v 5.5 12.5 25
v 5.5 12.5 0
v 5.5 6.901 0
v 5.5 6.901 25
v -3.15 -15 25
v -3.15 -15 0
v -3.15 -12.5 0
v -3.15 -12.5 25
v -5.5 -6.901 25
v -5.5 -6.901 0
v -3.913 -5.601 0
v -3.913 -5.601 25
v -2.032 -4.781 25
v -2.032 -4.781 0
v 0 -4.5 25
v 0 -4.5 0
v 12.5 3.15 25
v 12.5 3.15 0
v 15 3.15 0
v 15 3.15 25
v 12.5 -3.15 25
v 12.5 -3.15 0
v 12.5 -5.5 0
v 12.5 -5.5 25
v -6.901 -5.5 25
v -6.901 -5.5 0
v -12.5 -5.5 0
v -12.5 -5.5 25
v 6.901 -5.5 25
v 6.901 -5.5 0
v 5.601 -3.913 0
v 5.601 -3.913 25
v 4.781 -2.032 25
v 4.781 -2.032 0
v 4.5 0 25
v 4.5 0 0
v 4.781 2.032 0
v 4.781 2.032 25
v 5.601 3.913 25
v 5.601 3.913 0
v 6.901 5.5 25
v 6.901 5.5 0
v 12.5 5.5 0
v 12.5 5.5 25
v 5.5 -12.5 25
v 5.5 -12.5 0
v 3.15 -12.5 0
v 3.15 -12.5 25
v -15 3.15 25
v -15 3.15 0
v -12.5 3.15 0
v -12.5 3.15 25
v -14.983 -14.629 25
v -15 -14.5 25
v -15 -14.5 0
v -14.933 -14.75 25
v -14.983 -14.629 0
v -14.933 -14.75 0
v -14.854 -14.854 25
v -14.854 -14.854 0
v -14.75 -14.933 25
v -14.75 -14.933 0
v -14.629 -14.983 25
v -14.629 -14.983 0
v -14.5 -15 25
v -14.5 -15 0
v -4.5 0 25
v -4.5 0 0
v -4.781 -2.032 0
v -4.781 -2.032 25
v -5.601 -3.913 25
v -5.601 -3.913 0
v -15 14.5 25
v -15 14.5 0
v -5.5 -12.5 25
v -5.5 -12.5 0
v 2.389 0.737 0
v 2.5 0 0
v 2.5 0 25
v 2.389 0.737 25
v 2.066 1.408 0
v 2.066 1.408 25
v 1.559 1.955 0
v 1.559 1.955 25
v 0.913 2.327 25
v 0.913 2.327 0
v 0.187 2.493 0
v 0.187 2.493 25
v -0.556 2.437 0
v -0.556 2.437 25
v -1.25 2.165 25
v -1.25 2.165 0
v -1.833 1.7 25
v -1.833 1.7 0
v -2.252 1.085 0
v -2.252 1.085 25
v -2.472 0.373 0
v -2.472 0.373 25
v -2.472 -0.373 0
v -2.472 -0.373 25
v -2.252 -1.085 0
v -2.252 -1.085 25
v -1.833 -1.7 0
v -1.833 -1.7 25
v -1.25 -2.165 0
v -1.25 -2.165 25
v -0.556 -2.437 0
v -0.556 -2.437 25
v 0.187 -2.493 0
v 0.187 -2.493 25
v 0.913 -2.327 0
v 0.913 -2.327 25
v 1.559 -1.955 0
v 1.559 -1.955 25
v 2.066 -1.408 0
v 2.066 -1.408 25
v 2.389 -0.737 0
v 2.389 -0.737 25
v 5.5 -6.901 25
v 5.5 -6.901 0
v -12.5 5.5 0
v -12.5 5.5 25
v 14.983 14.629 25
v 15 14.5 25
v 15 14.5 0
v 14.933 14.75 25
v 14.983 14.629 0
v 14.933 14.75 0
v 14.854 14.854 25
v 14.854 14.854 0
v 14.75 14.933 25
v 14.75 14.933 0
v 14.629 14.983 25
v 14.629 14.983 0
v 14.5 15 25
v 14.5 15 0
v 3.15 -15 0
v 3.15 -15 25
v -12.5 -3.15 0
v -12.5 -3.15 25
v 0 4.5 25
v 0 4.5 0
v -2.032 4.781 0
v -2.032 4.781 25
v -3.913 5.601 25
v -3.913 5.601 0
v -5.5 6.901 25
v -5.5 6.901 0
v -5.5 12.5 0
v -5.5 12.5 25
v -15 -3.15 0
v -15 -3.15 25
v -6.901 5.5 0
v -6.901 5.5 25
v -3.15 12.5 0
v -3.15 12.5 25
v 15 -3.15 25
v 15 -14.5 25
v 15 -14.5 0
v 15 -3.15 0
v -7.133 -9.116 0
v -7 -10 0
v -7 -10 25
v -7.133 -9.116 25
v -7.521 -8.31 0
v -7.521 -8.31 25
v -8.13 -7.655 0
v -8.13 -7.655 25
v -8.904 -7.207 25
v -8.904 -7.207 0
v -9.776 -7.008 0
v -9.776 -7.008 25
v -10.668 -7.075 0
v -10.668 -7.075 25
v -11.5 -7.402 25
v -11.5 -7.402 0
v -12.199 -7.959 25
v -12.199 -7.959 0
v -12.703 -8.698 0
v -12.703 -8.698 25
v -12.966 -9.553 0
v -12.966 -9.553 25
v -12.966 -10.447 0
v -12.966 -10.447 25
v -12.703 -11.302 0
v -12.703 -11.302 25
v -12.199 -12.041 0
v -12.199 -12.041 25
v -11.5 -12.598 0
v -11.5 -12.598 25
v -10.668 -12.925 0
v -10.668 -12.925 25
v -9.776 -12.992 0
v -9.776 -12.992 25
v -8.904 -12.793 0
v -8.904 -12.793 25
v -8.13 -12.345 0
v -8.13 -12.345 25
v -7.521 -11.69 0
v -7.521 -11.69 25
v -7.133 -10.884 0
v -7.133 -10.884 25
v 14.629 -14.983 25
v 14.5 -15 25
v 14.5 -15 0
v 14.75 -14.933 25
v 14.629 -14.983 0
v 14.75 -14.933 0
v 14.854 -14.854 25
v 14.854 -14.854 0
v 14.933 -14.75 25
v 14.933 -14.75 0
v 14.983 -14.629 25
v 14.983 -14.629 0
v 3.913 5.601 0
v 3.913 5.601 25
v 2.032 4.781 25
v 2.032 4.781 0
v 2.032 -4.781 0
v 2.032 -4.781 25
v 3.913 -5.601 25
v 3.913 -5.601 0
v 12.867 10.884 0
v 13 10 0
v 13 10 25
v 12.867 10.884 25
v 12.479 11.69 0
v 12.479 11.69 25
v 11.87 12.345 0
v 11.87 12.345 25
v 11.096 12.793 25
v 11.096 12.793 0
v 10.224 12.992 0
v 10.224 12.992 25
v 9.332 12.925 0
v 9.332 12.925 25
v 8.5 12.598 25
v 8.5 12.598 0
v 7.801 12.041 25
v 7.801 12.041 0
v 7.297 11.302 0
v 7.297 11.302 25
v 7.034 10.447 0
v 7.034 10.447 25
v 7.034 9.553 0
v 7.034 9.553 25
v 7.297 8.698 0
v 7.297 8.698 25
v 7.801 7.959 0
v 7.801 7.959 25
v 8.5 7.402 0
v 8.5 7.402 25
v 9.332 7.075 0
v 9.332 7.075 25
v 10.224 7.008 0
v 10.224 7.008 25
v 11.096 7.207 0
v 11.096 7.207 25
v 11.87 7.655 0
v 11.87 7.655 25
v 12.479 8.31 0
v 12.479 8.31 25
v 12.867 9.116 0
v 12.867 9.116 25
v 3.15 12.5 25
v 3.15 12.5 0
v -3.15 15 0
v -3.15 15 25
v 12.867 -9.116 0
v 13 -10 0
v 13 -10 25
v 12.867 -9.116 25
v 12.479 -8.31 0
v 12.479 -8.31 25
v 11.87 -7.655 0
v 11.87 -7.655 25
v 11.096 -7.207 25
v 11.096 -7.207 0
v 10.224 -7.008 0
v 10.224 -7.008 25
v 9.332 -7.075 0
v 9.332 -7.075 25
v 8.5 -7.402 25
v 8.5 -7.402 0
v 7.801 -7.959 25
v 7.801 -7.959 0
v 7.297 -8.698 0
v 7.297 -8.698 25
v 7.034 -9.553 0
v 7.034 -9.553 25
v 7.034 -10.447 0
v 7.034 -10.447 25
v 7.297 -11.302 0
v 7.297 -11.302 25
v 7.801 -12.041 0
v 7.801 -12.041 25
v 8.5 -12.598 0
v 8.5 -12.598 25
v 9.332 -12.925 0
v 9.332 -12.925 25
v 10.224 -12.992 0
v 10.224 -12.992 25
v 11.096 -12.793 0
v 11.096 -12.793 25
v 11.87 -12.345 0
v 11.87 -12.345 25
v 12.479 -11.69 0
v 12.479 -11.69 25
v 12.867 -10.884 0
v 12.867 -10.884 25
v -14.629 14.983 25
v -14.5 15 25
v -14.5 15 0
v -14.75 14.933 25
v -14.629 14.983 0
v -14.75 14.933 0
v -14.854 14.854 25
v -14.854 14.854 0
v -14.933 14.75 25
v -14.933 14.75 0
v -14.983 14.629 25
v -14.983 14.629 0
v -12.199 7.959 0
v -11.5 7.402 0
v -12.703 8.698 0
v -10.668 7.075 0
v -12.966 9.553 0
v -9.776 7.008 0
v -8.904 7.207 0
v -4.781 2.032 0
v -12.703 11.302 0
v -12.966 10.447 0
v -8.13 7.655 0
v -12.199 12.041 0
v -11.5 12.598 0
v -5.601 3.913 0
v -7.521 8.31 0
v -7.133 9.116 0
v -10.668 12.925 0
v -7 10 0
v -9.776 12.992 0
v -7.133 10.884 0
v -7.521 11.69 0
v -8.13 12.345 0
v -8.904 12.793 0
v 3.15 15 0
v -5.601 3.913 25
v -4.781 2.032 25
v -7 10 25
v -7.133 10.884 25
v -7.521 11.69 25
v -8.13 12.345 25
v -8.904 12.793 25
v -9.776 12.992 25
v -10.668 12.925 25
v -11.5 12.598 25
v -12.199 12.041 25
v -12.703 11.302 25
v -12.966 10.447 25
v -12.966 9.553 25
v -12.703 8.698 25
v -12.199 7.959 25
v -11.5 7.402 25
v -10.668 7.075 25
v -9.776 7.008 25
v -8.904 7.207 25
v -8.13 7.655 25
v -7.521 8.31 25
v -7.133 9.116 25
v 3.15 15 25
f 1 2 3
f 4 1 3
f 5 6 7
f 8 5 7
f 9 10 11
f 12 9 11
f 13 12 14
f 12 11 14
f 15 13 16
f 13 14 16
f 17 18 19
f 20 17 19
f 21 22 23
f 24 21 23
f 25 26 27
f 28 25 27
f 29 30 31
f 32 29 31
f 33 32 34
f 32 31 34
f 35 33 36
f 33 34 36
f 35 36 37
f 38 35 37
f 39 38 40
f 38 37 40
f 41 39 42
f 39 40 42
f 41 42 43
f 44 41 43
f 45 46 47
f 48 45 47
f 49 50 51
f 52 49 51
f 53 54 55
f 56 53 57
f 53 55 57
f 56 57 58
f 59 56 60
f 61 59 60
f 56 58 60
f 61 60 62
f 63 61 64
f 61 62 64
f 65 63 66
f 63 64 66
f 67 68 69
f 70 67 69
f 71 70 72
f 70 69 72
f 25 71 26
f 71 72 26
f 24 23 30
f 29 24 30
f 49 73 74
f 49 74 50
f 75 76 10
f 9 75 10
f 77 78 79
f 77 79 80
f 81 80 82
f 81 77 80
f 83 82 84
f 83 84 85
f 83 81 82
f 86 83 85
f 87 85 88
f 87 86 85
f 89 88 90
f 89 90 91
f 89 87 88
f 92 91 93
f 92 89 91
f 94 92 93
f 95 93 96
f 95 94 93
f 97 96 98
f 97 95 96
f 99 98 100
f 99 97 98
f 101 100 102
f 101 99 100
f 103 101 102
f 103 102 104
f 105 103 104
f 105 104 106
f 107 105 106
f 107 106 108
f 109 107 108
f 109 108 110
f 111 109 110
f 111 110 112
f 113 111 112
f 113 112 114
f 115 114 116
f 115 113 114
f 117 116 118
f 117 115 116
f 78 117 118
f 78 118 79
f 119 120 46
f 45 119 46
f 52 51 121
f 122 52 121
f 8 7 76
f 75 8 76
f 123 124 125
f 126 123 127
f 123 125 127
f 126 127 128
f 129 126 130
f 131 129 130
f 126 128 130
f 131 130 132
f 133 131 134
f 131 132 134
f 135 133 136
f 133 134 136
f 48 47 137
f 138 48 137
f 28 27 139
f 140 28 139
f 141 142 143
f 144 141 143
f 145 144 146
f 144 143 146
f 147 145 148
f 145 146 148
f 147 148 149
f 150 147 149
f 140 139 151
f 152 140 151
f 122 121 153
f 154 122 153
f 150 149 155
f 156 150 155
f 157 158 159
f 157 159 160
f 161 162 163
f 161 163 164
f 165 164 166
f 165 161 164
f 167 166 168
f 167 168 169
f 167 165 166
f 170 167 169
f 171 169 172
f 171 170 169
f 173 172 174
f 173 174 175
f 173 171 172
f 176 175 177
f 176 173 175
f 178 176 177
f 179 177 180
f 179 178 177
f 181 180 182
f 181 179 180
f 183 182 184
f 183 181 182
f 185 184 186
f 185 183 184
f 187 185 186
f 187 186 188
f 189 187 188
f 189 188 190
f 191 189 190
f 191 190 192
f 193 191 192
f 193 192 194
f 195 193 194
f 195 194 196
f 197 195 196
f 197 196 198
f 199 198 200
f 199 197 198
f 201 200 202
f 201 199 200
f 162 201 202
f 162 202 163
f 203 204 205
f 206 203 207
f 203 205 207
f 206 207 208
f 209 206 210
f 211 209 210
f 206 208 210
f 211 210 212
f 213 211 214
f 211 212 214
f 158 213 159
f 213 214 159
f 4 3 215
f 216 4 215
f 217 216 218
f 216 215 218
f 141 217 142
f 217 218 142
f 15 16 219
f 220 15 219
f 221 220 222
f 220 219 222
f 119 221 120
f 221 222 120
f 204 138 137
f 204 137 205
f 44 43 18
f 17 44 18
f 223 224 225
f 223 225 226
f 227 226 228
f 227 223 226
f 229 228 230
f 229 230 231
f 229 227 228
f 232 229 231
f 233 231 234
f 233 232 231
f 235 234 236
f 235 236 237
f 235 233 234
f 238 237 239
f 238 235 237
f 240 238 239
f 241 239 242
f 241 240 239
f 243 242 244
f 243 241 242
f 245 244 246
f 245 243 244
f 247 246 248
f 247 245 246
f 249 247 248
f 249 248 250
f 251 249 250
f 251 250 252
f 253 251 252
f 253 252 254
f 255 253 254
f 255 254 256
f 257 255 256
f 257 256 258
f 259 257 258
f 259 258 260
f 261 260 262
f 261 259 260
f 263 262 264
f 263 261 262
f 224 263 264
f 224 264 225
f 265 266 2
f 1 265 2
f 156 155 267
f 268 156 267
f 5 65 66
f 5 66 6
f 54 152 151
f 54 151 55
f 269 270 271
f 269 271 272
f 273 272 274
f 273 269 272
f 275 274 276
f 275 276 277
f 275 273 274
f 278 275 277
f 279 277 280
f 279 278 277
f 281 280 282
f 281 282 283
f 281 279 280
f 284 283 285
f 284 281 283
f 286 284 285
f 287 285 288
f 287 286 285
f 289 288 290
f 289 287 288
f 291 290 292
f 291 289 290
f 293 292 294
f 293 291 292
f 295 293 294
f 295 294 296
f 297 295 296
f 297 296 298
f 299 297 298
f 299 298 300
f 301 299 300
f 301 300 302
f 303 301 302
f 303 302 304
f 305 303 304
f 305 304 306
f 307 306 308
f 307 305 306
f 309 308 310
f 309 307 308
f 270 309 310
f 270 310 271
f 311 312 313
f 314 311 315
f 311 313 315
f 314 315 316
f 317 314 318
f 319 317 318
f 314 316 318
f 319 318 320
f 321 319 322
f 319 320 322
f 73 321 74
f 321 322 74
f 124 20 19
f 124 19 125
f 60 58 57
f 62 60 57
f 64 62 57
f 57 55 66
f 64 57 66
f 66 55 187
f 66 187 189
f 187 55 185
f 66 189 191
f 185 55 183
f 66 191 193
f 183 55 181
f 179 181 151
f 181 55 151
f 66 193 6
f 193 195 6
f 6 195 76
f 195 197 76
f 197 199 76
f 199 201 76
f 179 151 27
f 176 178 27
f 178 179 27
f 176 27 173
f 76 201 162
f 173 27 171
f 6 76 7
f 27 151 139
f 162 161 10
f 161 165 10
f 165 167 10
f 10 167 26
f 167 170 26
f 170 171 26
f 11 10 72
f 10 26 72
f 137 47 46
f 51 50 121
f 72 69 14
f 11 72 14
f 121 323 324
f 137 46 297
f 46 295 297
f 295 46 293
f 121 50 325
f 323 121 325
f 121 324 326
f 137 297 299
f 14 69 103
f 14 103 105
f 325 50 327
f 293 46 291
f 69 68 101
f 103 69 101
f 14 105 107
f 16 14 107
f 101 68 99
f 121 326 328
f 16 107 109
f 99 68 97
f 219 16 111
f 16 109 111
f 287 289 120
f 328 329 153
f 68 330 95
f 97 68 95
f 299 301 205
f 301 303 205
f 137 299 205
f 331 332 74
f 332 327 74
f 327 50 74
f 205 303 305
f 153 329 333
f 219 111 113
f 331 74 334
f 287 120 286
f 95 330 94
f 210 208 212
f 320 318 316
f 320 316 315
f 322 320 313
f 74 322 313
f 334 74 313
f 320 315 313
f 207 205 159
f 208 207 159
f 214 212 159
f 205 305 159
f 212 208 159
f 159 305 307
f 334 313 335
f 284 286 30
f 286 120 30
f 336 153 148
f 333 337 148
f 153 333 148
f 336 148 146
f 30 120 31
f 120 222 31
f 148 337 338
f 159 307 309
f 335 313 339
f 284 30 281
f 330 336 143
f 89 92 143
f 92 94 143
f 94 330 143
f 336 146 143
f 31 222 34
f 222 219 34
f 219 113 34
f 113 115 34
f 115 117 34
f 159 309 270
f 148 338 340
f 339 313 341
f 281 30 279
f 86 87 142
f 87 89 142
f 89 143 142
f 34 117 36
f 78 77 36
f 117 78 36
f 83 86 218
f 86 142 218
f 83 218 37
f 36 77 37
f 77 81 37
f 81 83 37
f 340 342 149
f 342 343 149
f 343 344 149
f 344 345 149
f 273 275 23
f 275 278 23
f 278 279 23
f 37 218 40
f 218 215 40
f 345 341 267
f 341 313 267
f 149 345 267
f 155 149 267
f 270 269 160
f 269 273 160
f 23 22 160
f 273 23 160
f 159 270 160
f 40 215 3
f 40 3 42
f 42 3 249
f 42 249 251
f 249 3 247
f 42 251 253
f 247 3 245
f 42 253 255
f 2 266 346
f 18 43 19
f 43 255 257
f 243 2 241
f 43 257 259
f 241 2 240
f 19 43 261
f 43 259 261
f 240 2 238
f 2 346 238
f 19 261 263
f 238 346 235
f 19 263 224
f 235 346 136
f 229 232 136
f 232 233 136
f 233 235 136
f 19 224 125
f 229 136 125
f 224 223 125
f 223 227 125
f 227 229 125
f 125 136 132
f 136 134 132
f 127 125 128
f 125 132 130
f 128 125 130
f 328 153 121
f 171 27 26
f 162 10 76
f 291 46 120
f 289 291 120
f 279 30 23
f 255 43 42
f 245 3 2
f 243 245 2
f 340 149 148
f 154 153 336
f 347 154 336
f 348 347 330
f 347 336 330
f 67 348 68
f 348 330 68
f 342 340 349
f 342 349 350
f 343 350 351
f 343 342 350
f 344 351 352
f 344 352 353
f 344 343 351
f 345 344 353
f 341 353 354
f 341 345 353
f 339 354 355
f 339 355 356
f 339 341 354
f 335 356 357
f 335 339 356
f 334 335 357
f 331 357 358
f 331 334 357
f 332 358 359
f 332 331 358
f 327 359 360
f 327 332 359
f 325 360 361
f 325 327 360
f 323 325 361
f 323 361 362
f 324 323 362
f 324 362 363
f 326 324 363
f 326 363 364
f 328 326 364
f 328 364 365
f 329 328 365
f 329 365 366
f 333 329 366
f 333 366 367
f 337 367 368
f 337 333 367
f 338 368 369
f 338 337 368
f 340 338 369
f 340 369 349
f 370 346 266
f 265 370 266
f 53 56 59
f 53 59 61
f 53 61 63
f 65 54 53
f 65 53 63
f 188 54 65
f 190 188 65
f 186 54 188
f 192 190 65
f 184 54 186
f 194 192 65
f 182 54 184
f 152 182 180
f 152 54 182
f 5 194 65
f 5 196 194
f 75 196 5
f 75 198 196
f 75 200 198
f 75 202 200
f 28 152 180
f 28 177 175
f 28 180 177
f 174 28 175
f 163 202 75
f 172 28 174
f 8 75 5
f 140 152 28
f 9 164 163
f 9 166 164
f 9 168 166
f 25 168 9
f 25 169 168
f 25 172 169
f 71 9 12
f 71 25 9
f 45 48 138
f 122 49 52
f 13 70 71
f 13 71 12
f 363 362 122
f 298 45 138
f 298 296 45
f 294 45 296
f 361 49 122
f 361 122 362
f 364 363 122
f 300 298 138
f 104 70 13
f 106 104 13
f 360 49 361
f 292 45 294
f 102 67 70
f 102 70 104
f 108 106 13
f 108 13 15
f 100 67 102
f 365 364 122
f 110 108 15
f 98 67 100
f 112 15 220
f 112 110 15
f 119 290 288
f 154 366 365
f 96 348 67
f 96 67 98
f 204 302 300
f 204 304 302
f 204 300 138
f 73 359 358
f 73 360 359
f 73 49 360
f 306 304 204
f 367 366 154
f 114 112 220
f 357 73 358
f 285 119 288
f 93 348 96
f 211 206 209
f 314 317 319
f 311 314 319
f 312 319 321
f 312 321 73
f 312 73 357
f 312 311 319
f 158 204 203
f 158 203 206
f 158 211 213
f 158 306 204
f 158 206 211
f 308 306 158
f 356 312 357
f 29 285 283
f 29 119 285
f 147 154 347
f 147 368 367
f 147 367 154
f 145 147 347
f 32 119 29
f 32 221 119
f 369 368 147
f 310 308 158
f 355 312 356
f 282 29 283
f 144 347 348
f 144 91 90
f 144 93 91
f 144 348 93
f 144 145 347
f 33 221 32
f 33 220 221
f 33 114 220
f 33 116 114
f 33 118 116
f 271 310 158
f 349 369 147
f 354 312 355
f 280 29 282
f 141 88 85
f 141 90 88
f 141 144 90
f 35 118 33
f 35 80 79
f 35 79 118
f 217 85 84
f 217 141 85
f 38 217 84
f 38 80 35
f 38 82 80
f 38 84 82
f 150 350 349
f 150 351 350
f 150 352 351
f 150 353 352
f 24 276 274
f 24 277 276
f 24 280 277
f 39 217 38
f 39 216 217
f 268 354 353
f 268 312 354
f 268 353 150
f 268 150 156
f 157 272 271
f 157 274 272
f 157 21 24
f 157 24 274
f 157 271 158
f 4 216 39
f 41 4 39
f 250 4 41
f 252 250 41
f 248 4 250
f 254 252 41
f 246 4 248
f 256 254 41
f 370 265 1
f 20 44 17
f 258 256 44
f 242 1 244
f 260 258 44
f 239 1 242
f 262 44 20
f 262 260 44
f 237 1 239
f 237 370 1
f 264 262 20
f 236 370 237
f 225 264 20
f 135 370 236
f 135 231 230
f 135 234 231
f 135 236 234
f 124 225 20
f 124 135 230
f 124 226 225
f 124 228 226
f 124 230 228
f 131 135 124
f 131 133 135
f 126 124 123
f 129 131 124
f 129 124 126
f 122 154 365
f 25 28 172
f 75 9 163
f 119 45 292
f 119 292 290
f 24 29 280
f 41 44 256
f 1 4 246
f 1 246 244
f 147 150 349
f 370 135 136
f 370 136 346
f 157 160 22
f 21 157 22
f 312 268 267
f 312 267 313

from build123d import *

# Parameters (mm, degrees)
F0_R     = 3
F0_R_2   = 2.5
F1_DEPTH = 25


with BuildPart() as f1:
    # F0 (on Top) → F1 (new body)
    with BuildSketch(Plane.XY):
        with BuildLine():
            ThreePointArc((-14.5, 15), (-14.853553, 14.853553), (-15, 14.5))
            Line((-15, 14.5), (-15, 3.15))
            Line((-15, 3.15), (-12.5, 3.15))
            Line((-12.5, 3.15), (-12.5, 5.5))
            Line((-12.5, 5.5), (-6.90098, 5.5))
            ThreePointArc((-6.90098, 5.5), (-5.126404, 3.000613), (-4.5, 0))
            ThreePointArc((-4.5, 0), (-5.126404, -3.000613), (-6.90098, -5.5))
            Line((-6.90098, -5.5), (-12.5, -5.5))
            Line((-12.5, -5.5), (-12.5, -3.15))
            Line((-12.5, -3.15), (-15, -3.15))
            Line((-15, -3.15), (-15, -14.5))
            ThreePointArc((-15, -14.5), (-14.853553, -14.853553), (-14.5, -15))
            Line((-14.5, -15), (-3.15, -15))
            Line((-3.15, -15), (-3.15, -12.5))
            Line((-3.15, -12.5), (-5.5, -12.5))
            Line((-5.5, -12.5), (-5.5, -6.90098))
            ThreePointArc((-5.5, -6.90098), (-3.000613, -5.126404), (0, -4.5))
            ThreePointArc((0, -4.5), (3.000613, -5.126404), (5.5, -6.90098))
            Line((5.5, -6.90098), (5.5, -12.5))
            Line((5.5, -12.5), (3.15, -12.5))
            Line((3.15, -12.5), (3.15, -15))
            Line((3.15, -15), (14.5, -15))
            ThreePointArc((14.5, -15), (14.853553, -14.853553), (15, -14.5))
            Line((15, -14.5), (15, -3.15))
            Line((15, -3.15), (12.5, -3.15))
            Line((12.5, -3.15), (12.5, -5.5))
            Line((12.5, -5.5), (6.90098, -5.5))
            ThreePointArc((6.90098, -5.5), (5.126404, -3.000613), (4.5, 0))
            ThreePointArc((4.5, 0), (5.126404, 3.000613), (6.90098, 5.5))
            Line((6.90098, 5.5), (12.5, 5.5))
            Line((12.5, 5.5), (12.5, 3.15))
            Line((12.5, 3.15), (15, 3.15))
            Line((15, 3.15), (15, 14.5))
            ThreePointArc((15, 14.5), (14.853553, 14.853553), (14.5, 15))
            Line((14.5, 15), (3.15, 15))
            Line((3.15, 15), (3.15, 12.5))
            Line((3.15, 12.5), (5.5, 12.5))
            Line((5.5, 12.5), (5.5, 6.90098))
            ThreePointArc((5.5, 6.90098), (3.000613, 5.126404), (0, 4.5))
            ThreePointArc((0, 4.5), (-3.000613, 5.126404), (-5.5, 6.90098))
            Line((-5.5, 6.90098), (-5.5, 12.5))
            Line((-5.5, 12.5), (-3.15, 12.5))
            Line((-3.15, 12.5), (-3.15, 15))
            Line((-3.15, 15), (-14.5, 15))
        make_face()
        with Locations((-10, -10)):
            Circle(F0_R, mode=Mode.SUBTRACT)
        with Locations((10, -10)):
            Circle(F0_R, mode=Mode.SUBTRACT)
        Circle(F0_R_2, mode=Mode.SUBTRACT)
        with Locations((-10, 10)):
            Circle(F0_R, mode=Mode.SUBTRACT)
        with Locations((10, 10)):
            Circle(F0_R, mode=Mode.SUBTRACT)
    extrude(amount=F1_DEPTH)


solid = f1.part
